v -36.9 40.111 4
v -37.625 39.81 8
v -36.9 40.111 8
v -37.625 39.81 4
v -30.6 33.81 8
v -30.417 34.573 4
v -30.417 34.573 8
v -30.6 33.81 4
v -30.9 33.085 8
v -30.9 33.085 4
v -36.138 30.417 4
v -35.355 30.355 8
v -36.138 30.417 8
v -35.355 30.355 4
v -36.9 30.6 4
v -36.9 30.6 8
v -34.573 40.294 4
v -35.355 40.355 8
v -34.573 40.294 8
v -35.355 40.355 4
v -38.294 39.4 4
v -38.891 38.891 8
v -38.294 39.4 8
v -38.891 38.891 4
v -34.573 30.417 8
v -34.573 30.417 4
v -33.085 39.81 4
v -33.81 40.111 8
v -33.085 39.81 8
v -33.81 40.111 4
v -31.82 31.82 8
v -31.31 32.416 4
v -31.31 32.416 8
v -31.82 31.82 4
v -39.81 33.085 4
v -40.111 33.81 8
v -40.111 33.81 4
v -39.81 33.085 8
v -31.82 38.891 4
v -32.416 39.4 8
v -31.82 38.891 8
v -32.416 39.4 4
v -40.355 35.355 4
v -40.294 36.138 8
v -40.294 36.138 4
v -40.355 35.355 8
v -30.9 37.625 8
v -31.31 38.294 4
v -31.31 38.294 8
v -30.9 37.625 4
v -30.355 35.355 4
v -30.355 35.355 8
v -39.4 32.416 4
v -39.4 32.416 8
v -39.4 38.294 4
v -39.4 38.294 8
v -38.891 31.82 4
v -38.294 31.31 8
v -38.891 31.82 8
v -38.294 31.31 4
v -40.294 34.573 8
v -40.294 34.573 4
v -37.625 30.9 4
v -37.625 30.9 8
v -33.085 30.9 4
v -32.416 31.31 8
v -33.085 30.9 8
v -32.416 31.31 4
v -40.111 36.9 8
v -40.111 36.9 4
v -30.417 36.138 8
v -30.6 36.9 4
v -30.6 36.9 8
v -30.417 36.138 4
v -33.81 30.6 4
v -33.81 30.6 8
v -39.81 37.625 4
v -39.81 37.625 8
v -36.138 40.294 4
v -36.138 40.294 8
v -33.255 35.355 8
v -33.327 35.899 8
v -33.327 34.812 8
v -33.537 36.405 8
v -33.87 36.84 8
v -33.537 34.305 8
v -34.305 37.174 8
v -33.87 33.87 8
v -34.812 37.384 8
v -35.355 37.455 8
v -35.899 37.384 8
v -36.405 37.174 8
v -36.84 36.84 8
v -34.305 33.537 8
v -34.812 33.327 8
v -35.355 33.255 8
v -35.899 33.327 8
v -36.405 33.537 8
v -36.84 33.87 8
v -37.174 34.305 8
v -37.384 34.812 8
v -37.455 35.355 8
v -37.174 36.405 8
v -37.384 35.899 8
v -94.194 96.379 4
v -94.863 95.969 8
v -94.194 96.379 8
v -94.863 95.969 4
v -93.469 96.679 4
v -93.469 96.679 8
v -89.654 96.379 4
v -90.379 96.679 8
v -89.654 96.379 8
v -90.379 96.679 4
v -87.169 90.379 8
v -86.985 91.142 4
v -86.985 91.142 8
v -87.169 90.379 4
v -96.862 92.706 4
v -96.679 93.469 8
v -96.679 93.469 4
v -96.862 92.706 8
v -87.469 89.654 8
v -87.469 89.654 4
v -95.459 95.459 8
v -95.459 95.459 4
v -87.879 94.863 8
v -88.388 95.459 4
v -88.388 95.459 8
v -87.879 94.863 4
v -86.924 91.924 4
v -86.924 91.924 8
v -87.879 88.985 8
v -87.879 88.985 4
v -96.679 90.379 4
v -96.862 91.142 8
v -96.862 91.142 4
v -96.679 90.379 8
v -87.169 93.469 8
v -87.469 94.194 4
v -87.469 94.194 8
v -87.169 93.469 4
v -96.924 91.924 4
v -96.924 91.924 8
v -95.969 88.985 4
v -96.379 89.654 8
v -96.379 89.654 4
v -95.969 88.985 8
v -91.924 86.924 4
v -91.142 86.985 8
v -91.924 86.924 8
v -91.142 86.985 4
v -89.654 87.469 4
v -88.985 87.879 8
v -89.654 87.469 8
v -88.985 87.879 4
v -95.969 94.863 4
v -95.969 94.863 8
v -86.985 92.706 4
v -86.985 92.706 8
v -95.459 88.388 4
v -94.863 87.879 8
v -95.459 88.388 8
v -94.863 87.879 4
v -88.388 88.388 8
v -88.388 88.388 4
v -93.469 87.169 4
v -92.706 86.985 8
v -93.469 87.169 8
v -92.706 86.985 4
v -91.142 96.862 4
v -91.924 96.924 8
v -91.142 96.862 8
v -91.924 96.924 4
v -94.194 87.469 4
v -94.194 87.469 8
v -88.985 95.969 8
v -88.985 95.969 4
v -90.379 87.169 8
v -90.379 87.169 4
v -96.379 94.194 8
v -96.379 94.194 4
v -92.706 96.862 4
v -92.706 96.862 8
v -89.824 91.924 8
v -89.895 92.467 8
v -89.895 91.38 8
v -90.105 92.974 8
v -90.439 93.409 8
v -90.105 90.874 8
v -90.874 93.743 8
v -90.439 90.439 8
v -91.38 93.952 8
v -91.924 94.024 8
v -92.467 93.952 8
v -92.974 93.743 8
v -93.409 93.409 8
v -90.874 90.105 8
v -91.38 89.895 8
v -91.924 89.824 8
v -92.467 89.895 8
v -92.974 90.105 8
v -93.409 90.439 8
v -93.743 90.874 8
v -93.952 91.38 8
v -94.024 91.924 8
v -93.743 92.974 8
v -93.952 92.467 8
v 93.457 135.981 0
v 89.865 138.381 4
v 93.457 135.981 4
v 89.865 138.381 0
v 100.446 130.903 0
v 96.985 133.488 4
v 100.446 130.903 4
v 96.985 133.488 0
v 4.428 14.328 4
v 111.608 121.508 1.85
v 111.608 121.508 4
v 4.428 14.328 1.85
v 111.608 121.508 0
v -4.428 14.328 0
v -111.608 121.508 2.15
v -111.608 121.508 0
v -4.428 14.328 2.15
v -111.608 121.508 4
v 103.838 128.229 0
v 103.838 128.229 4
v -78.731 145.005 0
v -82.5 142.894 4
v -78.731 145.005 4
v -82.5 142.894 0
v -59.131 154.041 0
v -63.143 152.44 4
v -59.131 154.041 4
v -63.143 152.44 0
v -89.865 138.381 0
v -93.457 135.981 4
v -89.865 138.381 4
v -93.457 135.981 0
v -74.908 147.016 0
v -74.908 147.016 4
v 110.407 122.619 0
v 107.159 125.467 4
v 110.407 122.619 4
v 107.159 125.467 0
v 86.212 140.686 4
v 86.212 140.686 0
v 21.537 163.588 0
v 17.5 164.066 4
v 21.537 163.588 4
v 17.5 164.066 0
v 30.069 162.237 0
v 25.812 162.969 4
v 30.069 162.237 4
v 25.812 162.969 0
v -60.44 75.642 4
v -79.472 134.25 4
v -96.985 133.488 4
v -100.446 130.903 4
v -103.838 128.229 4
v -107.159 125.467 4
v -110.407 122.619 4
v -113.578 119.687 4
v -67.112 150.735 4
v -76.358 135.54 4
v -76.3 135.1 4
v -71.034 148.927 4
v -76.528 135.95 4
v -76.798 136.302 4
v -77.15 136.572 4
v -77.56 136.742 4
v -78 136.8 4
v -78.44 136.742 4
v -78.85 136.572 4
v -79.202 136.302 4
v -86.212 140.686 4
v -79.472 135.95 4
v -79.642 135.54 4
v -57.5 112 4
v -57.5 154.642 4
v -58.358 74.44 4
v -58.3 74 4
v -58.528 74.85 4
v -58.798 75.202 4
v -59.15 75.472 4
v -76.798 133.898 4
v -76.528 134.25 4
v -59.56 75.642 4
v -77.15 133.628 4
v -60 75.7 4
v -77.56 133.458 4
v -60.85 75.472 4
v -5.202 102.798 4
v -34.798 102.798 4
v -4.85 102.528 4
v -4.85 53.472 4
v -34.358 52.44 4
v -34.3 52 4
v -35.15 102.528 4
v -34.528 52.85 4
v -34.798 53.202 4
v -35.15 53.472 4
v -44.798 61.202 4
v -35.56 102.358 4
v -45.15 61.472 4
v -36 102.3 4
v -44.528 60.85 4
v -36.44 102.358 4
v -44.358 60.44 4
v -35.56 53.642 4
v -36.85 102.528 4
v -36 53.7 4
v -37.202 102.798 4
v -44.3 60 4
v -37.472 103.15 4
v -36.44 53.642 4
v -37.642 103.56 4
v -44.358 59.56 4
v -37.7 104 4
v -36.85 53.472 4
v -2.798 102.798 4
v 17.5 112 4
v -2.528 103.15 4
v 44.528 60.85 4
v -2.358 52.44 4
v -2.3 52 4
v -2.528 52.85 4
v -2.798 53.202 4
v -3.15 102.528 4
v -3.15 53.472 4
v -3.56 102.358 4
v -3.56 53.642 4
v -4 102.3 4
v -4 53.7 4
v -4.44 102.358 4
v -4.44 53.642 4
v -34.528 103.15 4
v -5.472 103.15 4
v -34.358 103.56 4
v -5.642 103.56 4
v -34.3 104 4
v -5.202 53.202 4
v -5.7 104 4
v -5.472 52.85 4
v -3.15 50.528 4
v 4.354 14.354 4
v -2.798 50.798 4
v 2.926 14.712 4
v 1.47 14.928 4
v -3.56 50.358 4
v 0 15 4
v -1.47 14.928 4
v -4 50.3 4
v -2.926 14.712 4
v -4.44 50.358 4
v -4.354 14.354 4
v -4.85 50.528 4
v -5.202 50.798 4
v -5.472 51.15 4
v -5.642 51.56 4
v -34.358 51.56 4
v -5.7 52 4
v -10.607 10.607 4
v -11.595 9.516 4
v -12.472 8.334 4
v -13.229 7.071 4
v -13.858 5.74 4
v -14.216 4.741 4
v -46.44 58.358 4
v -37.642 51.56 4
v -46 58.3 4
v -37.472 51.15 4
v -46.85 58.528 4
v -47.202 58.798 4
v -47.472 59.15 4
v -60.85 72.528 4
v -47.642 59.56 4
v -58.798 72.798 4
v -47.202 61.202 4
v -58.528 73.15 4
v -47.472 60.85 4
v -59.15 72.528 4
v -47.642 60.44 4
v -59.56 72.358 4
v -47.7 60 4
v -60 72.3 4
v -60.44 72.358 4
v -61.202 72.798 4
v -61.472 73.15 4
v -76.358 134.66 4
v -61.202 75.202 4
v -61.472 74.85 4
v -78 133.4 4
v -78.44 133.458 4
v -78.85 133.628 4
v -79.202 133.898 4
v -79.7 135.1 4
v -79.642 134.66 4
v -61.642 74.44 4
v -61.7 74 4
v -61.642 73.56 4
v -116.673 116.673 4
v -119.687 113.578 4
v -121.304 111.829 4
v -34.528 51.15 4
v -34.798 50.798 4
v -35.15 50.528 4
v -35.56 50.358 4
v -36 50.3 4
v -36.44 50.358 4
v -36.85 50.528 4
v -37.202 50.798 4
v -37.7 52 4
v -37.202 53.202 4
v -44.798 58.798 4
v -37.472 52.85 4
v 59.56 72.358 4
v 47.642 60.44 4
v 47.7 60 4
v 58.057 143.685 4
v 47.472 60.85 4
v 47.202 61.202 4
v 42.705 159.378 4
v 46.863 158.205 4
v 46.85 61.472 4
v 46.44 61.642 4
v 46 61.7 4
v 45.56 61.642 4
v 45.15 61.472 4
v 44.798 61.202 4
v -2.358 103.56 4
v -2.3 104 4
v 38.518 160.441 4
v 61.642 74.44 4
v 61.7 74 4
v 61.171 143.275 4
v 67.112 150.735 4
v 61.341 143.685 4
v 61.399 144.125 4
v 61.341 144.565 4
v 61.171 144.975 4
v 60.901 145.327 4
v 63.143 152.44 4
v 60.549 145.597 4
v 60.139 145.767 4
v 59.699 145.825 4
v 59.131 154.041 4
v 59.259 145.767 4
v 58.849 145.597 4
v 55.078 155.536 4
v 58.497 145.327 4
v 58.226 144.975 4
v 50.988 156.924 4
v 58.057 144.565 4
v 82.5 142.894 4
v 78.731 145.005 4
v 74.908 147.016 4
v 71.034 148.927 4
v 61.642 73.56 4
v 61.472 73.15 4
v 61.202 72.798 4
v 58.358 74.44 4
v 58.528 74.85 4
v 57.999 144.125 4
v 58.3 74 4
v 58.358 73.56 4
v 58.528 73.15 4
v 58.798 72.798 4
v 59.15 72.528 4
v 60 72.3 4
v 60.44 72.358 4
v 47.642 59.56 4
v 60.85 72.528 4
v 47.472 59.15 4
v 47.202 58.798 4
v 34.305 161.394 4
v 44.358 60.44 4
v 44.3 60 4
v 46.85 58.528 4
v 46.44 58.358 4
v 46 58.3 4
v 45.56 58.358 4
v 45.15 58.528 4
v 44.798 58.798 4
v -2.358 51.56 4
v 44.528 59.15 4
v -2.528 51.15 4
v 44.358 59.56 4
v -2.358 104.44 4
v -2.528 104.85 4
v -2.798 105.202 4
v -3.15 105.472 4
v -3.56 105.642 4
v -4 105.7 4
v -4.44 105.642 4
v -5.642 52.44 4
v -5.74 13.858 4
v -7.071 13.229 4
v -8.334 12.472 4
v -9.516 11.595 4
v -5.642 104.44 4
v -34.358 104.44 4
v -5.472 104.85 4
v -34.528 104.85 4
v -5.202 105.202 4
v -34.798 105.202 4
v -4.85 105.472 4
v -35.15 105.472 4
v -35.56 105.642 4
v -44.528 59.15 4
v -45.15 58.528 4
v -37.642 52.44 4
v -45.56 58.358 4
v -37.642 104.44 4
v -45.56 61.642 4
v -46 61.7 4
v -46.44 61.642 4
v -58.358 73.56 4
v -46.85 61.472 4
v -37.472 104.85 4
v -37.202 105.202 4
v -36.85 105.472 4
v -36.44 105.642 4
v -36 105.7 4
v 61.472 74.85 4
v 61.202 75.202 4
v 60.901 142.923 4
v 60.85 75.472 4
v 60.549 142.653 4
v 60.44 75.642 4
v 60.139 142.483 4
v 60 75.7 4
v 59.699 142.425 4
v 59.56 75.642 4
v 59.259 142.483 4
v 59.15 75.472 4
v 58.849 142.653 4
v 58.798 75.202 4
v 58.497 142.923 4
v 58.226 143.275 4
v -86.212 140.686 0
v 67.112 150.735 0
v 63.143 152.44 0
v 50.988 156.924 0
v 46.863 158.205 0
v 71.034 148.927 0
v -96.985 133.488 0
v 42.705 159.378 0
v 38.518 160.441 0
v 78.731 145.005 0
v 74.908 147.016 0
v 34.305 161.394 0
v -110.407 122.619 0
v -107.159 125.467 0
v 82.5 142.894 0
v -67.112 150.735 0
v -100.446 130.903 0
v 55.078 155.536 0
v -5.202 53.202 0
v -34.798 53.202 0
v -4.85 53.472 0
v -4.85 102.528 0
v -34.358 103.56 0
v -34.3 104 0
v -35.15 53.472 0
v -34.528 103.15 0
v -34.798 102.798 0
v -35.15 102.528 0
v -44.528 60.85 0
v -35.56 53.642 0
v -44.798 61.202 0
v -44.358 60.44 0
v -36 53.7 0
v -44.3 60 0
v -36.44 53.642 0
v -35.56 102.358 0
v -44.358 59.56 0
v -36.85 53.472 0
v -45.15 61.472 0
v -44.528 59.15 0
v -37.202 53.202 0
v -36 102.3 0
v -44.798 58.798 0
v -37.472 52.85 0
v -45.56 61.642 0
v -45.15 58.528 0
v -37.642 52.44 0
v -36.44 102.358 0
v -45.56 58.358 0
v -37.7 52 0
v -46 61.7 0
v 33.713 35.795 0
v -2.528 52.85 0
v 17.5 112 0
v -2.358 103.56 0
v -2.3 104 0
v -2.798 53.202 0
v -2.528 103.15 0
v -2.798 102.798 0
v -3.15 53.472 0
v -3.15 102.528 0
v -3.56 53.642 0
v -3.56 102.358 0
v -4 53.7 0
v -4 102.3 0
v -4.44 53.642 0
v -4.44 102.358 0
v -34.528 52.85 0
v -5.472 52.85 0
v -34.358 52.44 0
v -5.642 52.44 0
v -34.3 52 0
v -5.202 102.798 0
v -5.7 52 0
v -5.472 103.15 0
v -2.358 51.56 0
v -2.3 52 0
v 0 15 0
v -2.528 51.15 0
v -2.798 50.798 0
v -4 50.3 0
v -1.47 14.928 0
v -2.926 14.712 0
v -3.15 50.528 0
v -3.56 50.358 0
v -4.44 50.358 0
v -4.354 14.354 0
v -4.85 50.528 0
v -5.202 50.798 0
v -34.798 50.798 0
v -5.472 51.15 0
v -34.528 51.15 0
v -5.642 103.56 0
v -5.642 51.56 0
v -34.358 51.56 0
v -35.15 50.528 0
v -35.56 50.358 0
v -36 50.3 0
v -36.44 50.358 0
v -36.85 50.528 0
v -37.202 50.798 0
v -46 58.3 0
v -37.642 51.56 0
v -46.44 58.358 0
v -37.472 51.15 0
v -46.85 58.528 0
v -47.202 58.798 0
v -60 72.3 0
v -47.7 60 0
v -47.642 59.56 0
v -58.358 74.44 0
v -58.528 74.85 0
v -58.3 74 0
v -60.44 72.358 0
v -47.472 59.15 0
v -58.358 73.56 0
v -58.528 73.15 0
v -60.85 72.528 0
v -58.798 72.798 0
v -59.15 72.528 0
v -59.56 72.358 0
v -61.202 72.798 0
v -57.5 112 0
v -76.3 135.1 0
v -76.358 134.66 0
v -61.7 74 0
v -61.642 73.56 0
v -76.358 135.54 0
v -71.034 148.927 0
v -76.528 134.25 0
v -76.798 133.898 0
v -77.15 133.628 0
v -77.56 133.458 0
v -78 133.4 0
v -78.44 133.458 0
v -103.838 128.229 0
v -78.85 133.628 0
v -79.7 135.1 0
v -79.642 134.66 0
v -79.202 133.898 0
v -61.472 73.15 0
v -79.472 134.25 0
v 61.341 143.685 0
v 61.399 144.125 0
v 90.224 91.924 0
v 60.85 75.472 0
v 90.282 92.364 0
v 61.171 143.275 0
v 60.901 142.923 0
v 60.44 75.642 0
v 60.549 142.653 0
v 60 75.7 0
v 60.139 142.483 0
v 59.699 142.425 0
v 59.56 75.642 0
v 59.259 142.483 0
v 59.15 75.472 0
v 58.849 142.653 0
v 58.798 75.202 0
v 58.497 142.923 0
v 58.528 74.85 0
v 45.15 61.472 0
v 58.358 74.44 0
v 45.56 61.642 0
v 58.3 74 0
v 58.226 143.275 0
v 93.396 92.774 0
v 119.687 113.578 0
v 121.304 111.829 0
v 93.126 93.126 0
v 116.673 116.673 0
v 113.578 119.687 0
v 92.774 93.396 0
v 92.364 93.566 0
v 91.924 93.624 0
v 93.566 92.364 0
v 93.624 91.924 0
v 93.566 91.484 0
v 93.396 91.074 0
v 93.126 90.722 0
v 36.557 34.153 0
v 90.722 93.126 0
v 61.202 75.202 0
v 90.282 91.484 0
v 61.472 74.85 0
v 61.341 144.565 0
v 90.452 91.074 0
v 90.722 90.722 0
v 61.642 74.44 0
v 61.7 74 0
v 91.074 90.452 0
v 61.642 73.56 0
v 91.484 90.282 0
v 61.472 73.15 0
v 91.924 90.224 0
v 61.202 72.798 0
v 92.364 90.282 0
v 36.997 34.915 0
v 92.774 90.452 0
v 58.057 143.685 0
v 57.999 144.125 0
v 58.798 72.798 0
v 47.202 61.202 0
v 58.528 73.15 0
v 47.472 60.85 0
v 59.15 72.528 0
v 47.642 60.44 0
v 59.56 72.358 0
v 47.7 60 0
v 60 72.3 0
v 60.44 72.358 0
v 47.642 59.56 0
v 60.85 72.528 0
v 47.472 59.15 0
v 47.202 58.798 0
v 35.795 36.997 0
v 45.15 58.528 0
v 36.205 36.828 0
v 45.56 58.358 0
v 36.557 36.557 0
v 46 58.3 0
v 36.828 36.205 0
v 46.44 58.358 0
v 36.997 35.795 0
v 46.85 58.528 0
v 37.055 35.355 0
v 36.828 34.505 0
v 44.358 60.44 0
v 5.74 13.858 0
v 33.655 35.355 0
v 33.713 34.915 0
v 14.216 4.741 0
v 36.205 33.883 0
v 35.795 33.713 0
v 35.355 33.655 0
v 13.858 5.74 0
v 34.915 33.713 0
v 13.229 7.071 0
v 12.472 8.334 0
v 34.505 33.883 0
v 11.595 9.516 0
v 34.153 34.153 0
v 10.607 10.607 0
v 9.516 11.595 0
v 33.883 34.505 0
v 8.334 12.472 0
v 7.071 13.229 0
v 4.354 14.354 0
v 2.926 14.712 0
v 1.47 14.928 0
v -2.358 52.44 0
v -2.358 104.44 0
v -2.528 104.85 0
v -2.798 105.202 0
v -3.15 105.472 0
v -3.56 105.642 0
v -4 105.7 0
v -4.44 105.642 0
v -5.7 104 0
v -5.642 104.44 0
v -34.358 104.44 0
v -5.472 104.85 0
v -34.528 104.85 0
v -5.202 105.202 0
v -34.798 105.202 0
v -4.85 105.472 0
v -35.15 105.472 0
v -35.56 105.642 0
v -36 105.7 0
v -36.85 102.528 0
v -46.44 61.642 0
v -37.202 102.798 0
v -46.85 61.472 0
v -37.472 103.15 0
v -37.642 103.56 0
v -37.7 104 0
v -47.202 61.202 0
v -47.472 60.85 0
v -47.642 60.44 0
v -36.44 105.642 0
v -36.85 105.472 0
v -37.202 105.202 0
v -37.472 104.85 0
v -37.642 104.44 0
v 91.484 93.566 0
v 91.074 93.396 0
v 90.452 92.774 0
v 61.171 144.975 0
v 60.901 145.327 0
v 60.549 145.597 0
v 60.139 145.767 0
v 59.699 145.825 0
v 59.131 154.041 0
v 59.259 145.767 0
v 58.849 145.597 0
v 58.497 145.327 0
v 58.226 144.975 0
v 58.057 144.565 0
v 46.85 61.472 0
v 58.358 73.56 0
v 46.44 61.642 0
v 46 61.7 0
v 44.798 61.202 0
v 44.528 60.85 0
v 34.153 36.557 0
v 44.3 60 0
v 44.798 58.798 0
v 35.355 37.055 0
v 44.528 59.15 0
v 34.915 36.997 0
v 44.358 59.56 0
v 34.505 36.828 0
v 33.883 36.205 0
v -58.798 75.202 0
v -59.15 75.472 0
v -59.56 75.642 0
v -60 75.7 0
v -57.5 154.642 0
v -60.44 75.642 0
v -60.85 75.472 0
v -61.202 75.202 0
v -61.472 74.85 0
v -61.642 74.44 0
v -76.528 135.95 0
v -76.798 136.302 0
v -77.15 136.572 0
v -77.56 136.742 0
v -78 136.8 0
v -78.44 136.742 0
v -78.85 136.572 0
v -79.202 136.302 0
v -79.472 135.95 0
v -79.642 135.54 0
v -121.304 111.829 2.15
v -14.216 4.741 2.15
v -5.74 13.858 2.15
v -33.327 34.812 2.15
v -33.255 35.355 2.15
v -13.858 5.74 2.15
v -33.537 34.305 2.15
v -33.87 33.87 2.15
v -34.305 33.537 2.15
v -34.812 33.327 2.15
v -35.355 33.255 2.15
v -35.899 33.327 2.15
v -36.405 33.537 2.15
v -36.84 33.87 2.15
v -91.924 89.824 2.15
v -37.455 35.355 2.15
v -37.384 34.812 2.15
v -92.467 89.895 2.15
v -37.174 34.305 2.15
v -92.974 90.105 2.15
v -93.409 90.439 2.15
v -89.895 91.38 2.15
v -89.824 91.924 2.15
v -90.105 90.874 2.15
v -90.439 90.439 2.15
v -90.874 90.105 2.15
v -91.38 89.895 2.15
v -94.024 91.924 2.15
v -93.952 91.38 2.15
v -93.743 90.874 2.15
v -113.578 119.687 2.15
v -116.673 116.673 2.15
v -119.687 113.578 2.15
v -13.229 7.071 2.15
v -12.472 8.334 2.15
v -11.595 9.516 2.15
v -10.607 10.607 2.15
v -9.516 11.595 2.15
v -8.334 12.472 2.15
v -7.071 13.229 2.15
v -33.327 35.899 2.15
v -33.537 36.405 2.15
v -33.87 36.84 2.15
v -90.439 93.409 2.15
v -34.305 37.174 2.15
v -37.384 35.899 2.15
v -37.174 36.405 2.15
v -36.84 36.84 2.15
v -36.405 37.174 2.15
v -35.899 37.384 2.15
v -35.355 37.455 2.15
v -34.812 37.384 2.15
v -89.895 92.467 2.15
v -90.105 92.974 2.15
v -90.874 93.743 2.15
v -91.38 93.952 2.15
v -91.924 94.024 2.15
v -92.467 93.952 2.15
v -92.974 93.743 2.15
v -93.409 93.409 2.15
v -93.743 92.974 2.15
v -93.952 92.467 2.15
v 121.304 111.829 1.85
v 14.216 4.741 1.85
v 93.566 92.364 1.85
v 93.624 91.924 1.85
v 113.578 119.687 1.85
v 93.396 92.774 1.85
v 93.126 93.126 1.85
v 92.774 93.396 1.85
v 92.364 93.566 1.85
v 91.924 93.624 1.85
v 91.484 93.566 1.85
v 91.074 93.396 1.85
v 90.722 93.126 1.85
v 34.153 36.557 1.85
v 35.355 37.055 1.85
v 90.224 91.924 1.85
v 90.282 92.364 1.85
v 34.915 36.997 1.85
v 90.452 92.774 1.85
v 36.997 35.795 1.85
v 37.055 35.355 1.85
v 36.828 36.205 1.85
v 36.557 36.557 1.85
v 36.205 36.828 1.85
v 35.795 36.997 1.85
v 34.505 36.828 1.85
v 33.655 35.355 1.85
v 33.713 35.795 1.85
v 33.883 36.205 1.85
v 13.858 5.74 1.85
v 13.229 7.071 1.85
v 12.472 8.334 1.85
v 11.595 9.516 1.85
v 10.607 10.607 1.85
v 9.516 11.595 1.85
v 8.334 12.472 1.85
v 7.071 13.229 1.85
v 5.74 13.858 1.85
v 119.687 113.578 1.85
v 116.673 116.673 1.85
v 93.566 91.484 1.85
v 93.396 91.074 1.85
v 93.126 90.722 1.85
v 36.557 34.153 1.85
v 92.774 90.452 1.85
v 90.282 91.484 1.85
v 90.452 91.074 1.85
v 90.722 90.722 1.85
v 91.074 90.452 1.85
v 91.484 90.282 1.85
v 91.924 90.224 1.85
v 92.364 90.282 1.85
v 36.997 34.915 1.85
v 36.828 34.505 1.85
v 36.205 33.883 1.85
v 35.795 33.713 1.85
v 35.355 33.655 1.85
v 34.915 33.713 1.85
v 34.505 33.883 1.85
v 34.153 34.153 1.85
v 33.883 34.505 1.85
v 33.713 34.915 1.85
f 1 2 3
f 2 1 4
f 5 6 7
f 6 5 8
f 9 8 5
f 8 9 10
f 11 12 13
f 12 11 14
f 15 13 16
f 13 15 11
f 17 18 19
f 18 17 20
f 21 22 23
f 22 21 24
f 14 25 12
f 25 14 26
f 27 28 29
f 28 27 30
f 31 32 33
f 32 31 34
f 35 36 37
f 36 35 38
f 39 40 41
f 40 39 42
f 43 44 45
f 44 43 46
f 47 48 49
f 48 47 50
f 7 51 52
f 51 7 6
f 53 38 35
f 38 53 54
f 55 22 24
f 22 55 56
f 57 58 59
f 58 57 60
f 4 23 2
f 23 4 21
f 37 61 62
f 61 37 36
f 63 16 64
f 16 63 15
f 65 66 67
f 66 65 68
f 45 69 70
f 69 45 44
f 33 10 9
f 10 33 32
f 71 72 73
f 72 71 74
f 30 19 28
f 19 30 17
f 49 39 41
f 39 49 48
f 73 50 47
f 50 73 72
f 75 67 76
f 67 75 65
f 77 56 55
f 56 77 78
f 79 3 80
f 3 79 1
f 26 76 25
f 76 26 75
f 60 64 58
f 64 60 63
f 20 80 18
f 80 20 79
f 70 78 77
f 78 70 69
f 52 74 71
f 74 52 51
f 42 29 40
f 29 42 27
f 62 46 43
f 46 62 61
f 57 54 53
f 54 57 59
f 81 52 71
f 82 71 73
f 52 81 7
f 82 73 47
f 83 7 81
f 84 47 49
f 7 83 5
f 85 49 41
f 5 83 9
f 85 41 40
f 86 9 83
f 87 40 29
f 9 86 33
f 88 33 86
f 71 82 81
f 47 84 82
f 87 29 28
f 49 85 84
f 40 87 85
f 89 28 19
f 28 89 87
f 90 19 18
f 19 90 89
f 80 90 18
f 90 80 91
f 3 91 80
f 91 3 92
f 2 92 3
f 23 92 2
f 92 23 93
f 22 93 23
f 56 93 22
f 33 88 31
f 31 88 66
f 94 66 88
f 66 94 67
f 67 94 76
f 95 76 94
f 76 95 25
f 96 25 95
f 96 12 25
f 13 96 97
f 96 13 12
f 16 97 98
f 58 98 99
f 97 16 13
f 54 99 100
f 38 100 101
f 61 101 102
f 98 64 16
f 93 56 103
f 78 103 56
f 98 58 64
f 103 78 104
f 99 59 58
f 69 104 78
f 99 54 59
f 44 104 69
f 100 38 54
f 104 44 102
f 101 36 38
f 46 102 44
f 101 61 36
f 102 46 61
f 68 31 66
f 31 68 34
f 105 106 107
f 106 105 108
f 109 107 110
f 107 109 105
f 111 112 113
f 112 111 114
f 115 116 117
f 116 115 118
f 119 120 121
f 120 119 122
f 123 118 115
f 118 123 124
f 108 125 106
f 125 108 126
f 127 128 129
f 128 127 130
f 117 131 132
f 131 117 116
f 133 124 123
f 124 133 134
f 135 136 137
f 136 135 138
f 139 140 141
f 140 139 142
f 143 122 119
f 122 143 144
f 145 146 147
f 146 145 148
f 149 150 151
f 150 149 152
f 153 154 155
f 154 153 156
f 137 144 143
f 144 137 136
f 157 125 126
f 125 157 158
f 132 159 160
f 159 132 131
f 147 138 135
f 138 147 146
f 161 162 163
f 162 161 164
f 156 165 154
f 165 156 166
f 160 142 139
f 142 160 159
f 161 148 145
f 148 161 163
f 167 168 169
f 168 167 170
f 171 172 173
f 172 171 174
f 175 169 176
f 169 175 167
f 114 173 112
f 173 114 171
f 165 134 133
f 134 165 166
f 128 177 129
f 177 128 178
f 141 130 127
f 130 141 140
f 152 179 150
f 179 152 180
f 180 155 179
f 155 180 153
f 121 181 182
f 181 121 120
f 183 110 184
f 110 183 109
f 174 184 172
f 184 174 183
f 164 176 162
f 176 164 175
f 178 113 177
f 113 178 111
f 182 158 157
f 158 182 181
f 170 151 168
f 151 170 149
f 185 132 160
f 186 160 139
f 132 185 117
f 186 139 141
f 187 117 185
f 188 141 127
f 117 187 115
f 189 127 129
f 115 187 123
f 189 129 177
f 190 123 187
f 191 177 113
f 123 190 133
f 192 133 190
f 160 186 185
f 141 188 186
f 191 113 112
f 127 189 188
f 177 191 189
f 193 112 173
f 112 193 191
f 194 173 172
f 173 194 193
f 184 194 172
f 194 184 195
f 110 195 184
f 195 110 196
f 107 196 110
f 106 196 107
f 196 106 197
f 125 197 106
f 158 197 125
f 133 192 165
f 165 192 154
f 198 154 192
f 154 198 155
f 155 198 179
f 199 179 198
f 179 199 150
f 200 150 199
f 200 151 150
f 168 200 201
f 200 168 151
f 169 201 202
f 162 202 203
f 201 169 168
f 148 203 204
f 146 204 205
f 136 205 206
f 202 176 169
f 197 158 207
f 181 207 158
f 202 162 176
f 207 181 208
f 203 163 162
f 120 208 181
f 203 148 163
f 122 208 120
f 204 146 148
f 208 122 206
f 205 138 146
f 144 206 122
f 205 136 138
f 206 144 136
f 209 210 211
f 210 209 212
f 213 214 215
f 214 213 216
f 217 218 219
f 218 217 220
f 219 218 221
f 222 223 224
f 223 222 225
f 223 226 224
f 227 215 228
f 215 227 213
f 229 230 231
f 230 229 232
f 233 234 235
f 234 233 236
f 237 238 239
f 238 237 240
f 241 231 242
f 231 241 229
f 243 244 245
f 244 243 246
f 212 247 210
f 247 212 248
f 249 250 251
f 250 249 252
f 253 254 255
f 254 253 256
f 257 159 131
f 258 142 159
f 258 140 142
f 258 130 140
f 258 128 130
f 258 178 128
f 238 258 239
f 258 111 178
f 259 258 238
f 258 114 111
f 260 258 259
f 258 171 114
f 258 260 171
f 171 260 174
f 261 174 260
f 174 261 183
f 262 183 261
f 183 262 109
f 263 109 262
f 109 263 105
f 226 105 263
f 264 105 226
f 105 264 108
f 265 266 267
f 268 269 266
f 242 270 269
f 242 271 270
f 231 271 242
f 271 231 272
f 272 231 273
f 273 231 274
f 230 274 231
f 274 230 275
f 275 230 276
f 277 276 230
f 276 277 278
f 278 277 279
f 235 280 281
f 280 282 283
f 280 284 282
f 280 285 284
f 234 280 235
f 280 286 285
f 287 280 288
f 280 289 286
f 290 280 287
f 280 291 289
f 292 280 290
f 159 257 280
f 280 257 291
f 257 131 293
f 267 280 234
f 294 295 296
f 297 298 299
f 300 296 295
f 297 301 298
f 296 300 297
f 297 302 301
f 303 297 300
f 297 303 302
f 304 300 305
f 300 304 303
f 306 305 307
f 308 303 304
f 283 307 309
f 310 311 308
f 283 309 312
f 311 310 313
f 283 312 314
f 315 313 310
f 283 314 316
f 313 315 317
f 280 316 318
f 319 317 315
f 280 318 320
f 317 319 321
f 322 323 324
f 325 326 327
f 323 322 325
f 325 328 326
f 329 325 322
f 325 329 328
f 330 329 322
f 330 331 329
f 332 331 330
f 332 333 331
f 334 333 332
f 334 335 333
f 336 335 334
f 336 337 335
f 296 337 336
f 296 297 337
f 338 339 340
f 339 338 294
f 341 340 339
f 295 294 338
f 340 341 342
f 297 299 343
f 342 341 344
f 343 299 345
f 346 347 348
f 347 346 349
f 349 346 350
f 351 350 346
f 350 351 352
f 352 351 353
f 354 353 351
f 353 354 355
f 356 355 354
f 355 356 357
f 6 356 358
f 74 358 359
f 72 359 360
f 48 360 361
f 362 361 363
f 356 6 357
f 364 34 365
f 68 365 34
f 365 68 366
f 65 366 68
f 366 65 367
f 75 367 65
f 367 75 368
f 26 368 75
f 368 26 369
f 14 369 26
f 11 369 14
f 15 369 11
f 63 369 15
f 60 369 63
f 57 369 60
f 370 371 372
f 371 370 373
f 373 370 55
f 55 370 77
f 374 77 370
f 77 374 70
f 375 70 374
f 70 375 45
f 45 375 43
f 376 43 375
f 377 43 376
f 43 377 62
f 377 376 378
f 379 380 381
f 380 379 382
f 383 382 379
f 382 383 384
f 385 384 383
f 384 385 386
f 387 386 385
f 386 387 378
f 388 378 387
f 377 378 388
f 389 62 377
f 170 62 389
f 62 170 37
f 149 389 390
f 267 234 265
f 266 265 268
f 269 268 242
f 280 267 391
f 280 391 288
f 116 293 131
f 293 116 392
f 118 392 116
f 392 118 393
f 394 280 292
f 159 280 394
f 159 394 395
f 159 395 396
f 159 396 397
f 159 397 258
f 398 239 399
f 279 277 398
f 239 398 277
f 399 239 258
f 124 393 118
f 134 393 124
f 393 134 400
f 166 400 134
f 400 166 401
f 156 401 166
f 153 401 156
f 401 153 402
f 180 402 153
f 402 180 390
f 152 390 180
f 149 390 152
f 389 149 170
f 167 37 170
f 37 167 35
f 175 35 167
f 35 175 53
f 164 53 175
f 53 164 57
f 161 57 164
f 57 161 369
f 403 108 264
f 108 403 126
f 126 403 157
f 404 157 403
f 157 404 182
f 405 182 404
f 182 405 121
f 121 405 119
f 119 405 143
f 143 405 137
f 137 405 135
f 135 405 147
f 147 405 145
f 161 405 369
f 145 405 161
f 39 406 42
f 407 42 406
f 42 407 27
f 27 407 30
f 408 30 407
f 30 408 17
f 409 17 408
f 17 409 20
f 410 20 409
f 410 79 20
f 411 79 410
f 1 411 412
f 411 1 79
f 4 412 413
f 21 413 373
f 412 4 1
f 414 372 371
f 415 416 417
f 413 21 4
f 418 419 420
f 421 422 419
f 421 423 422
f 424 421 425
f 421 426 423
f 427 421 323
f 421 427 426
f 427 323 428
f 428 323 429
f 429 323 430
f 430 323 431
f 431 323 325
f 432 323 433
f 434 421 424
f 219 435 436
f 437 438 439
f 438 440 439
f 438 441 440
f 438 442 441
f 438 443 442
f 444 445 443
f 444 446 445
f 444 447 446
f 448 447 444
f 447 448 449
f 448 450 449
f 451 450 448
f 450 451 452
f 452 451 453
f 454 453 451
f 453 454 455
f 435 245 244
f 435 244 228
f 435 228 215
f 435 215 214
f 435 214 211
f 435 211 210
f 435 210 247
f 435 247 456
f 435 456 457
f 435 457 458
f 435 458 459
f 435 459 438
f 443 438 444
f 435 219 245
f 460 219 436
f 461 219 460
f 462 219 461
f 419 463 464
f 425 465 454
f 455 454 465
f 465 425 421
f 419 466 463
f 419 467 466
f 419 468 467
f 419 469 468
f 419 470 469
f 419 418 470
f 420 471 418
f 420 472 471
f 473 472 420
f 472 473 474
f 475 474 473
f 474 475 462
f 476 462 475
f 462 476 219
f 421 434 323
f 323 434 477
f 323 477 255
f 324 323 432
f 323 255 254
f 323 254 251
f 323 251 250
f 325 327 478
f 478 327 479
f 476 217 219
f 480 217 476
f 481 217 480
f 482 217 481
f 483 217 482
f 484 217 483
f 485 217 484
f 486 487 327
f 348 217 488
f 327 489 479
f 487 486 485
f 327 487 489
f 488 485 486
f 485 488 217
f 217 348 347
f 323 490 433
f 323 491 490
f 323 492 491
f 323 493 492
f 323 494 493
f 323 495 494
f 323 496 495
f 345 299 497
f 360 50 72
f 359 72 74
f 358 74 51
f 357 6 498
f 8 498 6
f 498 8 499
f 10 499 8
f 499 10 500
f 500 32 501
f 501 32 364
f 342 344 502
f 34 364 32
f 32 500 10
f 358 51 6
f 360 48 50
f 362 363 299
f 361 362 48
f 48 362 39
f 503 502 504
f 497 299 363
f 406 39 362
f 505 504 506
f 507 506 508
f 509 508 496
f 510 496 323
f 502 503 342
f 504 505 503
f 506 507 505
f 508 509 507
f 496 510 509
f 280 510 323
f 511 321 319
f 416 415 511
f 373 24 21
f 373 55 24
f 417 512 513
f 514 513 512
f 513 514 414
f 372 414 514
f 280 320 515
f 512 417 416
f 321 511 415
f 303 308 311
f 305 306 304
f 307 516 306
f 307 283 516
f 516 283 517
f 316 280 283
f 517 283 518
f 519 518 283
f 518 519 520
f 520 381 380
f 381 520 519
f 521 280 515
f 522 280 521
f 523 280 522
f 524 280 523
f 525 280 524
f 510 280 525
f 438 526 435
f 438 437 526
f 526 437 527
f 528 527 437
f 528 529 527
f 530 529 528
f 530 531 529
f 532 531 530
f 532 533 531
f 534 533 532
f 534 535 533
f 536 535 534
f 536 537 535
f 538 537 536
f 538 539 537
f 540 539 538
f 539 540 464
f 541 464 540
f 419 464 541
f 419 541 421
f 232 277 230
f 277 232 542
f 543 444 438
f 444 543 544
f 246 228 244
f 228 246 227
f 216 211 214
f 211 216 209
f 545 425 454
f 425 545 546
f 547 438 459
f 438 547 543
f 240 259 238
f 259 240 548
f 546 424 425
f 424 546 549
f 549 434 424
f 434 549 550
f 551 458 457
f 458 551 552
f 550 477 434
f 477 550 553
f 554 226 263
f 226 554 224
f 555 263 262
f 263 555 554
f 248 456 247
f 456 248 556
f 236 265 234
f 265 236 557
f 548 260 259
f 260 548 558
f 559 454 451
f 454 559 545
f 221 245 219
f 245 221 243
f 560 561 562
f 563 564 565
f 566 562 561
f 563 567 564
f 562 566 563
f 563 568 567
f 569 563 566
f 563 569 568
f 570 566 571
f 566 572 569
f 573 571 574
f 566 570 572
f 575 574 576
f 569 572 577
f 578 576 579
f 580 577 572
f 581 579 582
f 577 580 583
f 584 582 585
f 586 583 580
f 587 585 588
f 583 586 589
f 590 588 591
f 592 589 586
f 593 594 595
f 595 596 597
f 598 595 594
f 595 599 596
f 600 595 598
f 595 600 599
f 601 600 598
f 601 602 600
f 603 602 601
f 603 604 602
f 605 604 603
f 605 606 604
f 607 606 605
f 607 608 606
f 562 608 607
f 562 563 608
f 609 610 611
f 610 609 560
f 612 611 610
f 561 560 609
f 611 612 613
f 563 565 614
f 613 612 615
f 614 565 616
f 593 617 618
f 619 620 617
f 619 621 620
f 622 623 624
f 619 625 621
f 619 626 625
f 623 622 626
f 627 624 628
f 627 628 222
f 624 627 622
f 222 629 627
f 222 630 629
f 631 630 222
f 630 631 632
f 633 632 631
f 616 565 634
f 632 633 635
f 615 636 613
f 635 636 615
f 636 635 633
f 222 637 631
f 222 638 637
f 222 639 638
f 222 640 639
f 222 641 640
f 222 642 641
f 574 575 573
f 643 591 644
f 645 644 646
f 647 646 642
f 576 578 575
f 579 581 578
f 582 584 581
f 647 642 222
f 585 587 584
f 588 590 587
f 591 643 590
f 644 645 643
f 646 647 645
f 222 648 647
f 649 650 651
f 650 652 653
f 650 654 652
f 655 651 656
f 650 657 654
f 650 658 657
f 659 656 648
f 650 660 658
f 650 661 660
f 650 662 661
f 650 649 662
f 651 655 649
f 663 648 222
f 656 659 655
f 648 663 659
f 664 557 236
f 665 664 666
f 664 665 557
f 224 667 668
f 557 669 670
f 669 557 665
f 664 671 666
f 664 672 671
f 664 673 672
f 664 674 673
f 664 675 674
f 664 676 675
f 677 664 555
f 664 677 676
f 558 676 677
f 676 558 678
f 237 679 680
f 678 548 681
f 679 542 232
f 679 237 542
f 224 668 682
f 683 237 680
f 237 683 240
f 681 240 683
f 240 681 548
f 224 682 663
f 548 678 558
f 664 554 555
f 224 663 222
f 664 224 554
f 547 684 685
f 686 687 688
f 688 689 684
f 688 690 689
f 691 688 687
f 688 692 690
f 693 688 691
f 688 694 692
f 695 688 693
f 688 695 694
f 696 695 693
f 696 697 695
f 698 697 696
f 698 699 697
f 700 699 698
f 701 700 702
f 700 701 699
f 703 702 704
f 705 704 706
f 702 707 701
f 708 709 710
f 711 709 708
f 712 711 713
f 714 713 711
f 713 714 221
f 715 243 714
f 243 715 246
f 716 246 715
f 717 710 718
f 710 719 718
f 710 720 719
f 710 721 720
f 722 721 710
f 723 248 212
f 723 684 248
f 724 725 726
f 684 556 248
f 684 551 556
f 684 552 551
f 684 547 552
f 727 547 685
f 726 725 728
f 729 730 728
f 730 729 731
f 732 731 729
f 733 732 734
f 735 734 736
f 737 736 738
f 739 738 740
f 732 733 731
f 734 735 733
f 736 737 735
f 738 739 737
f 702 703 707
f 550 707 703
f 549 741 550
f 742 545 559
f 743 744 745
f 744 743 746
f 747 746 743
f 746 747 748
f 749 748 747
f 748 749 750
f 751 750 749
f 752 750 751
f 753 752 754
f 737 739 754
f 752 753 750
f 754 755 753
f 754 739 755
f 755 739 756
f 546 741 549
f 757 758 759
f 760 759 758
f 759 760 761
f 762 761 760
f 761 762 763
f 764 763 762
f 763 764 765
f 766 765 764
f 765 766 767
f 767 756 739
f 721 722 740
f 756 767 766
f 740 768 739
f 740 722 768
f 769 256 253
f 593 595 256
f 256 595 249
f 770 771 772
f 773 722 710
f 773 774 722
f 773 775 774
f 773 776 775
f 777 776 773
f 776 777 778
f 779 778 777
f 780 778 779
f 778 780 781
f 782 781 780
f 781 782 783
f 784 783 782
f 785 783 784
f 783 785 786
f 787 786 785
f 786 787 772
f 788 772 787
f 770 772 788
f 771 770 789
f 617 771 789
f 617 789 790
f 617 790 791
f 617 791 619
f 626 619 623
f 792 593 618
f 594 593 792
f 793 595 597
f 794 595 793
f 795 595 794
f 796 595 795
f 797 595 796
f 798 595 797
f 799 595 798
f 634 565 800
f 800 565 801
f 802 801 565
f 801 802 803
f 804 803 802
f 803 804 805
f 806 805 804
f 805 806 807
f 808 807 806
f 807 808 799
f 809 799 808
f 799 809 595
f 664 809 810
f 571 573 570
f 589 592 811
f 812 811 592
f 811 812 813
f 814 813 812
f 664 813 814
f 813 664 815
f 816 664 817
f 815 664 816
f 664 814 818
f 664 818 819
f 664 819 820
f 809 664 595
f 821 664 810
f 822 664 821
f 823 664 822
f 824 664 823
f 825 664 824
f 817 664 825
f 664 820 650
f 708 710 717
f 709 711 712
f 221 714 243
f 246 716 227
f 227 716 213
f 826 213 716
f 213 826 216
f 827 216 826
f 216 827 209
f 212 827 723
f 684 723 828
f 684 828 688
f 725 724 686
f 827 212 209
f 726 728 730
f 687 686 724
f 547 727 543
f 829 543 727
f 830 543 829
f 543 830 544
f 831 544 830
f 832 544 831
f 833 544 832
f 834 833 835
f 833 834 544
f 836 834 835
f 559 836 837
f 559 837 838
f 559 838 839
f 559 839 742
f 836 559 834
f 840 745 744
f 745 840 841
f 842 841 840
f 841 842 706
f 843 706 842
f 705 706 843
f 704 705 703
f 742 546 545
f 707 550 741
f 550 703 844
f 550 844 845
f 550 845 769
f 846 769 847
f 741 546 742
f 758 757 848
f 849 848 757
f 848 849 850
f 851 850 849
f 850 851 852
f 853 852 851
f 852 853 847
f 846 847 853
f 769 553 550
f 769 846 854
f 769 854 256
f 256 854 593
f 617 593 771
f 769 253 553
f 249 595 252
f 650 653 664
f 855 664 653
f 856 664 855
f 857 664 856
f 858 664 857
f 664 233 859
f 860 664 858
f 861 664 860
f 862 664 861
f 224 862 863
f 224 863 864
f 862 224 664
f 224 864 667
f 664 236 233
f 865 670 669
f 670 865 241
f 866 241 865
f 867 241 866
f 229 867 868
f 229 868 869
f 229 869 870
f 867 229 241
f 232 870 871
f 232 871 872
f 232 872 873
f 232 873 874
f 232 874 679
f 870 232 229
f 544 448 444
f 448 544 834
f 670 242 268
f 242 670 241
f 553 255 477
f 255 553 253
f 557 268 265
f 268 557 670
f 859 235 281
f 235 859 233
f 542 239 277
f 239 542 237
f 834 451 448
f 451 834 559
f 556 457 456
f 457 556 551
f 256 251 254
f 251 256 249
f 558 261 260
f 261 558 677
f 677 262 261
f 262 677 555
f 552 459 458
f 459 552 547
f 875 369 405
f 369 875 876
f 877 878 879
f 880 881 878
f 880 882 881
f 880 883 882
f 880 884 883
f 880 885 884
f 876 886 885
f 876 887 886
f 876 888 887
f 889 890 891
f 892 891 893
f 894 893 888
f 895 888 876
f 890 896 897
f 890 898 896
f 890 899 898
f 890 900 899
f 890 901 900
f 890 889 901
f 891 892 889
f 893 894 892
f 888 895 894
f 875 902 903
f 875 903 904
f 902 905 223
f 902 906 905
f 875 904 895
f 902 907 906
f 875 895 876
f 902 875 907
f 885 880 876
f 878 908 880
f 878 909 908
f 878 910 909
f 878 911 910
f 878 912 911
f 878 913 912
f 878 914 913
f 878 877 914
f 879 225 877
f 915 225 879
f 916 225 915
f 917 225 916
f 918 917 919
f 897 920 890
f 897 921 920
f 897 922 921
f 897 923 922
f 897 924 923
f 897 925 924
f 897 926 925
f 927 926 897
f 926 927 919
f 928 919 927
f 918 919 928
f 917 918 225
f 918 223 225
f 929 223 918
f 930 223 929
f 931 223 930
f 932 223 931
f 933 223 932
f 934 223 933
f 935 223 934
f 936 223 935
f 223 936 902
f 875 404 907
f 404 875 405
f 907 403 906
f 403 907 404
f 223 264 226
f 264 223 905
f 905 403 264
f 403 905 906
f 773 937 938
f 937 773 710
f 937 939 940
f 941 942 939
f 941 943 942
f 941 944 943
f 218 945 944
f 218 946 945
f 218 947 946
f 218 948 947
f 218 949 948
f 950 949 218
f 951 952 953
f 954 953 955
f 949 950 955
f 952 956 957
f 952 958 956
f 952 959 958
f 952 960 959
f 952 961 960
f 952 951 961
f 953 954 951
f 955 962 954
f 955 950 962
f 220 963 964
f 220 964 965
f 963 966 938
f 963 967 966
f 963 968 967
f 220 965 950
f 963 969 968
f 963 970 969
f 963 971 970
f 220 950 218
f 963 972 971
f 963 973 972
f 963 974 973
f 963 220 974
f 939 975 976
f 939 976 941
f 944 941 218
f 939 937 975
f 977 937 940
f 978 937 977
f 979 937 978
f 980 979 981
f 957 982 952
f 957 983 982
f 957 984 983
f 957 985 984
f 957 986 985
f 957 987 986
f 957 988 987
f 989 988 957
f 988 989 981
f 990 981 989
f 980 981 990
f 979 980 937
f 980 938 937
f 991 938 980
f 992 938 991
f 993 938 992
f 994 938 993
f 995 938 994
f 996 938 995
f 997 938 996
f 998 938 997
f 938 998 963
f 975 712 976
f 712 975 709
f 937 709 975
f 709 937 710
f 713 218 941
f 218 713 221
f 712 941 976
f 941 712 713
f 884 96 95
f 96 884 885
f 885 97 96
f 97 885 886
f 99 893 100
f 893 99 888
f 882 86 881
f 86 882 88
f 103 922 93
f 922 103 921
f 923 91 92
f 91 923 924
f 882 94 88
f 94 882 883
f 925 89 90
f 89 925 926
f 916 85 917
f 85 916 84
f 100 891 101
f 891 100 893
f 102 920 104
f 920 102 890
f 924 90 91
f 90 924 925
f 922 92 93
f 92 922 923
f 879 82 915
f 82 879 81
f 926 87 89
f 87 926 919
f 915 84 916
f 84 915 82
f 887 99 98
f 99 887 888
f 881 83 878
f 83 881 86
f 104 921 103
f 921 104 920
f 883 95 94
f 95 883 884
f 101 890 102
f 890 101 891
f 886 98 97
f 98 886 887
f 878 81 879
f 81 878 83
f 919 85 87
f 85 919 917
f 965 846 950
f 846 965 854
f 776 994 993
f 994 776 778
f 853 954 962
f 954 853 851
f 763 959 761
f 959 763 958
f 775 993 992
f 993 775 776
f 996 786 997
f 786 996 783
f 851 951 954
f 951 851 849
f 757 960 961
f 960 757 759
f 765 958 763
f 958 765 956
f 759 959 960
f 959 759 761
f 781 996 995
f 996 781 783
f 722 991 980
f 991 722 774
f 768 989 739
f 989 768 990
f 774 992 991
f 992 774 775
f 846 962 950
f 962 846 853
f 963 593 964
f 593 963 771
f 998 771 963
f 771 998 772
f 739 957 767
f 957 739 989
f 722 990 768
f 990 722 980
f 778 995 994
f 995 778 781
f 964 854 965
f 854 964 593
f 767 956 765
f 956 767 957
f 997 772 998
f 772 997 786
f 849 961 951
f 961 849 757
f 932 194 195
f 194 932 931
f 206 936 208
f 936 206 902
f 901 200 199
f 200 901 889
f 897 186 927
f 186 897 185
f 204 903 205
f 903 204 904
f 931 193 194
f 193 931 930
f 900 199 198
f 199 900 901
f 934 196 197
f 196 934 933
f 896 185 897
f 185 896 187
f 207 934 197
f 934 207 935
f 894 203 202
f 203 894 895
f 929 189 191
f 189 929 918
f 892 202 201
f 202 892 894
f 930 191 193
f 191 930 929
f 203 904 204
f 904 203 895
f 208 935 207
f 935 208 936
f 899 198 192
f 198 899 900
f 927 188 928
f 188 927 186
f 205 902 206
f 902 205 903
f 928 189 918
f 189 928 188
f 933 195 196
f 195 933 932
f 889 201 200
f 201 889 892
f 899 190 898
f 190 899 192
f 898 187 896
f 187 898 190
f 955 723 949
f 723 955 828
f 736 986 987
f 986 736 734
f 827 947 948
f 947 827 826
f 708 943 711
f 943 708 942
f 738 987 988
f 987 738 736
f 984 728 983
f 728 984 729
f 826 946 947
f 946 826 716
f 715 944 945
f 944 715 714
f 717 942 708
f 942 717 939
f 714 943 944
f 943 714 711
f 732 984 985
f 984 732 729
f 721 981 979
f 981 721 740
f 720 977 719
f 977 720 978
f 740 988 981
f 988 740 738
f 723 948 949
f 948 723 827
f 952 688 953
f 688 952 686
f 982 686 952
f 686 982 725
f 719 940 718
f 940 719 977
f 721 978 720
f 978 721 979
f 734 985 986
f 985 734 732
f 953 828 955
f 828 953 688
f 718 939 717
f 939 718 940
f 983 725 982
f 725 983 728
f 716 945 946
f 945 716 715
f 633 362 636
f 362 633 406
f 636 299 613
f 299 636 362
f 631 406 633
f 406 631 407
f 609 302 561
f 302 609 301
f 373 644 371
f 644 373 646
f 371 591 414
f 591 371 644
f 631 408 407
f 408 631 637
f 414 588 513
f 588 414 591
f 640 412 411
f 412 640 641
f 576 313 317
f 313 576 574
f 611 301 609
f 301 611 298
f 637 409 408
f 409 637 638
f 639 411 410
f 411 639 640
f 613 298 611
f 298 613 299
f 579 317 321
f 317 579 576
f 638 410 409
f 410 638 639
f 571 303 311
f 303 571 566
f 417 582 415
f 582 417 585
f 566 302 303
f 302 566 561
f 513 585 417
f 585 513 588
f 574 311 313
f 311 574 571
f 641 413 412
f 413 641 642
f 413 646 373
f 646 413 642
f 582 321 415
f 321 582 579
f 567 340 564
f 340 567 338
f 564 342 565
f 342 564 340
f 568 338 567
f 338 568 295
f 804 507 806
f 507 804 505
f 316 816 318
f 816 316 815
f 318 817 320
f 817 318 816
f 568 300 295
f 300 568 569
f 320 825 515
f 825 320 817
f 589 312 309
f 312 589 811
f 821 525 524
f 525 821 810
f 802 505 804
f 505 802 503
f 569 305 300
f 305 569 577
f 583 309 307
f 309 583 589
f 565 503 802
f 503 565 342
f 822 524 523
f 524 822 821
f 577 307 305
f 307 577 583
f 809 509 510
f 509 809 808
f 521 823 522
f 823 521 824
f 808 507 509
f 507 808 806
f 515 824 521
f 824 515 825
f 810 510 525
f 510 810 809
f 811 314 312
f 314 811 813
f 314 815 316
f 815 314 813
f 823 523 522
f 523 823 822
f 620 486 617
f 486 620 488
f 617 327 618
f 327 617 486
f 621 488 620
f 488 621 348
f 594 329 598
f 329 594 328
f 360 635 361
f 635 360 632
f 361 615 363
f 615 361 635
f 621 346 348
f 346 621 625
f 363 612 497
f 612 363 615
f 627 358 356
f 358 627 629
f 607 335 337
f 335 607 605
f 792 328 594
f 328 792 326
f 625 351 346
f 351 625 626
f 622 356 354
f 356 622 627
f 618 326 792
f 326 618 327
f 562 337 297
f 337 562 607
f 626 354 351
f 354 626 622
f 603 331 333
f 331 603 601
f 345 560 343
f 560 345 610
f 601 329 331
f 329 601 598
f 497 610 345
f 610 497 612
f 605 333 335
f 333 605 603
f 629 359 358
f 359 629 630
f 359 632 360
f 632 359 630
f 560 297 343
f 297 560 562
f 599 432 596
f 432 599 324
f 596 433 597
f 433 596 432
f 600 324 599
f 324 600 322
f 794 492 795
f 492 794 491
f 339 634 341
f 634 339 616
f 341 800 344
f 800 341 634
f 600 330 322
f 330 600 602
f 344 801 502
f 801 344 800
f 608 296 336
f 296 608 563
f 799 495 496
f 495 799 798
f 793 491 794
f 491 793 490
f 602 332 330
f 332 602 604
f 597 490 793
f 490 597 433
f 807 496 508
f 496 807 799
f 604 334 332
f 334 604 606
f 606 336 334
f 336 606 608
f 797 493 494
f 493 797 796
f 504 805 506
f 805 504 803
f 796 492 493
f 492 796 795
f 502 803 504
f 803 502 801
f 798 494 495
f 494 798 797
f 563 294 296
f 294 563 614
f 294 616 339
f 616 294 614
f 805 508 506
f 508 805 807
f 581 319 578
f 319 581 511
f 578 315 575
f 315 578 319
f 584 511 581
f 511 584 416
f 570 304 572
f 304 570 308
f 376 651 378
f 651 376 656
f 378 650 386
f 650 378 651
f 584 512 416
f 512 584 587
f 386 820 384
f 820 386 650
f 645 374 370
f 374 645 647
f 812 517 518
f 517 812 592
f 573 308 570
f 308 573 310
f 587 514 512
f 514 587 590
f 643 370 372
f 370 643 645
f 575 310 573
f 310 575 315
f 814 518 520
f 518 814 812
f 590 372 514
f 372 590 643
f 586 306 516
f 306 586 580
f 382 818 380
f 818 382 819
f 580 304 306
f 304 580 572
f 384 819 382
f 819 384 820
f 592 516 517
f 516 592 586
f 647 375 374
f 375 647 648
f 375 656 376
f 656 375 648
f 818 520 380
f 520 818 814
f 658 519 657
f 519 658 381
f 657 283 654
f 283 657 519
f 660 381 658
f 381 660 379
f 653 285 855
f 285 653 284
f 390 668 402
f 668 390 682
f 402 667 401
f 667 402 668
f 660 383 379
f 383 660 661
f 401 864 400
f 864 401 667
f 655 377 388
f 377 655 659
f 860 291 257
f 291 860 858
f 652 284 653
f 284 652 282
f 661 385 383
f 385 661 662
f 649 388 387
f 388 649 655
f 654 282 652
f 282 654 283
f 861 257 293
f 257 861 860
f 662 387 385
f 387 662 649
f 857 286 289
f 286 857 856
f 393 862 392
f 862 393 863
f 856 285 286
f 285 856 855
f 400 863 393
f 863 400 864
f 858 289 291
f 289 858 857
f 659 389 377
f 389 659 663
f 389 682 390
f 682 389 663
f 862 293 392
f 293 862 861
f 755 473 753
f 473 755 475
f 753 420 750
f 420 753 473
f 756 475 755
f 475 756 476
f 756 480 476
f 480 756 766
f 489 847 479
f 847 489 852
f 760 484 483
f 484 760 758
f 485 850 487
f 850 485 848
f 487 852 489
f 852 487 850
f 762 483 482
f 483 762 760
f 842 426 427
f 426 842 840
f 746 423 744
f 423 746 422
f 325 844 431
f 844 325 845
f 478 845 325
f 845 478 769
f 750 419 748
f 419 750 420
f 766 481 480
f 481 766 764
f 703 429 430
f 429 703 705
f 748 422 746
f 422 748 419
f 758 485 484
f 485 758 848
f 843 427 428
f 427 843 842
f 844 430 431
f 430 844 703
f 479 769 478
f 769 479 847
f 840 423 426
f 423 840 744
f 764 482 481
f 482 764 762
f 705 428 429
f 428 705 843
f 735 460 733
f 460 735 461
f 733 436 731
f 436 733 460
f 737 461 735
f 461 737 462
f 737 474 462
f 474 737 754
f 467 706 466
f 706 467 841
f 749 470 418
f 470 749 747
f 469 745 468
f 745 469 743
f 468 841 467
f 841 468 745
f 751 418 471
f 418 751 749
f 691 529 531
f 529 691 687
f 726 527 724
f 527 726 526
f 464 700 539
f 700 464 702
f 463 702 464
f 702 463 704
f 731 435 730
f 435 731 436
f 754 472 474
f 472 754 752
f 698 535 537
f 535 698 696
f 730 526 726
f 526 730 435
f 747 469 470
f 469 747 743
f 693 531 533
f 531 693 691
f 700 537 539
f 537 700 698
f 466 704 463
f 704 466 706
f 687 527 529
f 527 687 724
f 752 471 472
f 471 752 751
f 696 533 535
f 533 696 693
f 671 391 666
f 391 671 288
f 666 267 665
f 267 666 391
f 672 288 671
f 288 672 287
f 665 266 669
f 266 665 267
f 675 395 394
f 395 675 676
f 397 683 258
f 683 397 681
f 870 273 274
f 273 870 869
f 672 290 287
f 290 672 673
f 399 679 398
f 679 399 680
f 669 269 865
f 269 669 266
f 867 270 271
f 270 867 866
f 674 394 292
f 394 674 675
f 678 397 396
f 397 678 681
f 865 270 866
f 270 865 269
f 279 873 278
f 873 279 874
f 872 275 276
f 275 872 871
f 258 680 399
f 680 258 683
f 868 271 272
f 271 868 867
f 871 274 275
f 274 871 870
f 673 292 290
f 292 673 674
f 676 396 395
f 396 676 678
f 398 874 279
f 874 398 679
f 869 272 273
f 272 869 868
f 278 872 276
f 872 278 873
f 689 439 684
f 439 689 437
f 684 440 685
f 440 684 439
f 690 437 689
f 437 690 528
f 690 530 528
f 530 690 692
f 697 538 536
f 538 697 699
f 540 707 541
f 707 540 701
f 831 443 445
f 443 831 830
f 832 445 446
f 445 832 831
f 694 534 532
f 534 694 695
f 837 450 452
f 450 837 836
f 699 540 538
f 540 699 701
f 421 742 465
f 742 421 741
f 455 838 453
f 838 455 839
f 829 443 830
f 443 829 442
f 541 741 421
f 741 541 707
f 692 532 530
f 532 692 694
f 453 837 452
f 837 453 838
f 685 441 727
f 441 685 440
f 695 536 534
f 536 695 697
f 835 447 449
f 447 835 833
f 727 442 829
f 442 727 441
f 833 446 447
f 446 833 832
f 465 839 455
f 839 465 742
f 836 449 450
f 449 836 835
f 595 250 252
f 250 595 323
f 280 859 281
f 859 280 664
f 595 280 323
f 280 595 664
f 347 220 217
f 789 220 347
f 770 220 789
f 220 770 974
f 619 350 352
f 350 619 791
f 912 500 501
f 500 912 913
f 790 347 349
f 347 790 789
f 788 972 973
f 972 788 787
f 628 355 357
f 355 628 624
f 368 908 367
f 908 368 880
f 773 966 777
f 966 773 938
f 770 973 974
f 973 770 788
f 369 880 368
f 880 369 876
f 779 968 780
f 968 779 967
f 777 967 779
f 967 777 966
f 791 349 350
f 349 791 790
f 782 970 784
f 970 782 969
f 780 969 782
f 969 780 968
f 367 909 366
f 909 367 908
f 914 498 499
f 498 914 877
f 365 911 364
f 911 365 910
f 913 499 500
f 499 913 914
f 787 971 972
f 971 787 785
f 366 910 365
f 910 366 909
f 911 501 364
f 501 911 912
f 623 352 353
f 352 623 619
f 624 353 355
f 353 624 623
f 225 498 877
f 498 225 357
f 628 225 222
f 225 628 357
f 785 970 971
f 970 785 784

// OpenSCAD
// file: robot_floor_front.scad
// =====================================================================
//  robot body :: floor plate quadrant FRONT (centred on +X). Print 1.
//  The four quadrants (front / left / rear / right) share one generic module,
//  robot_floor_quad(i), defined HERE; robot_floor_left/rear/right.scad `use` this
//  file. The seam scheme is rotationally symmetric, so the quadrants are the same
//  plate rotated by 90 deg plus their own cut-outs.
//  world (robot frame): plate z 14..18, radius rb_R, sector -45..+45 deg.
//    Seams on the diagonals (rb_floor_seams), rb_seam_gap 0.3 mm everywhere.
//    Seam joint = 14 mm wide half-thickness lap. At a quadrant's CCW edge it is the
//    UPPER lap (z 16.15..18, 2x M3 clearance 3.4); at its CW edge it is the LOWER lap
//    (z 14..15.85) with a d10 boss below (z 10..14) carrying a through hole d4.2: the
//    M3 heat-set insert is pressed in from the boss tip, the M3x10 comes from ABOVE
//    through the neighbour's upper lap. Screws at r 50 and r 130 on each seam
//    (clear of the pillar flanges at r 67..103 and of every fixing hole).
//    Plain d3.4 holes at every rb_fix_* point (screws from below, inserts in the parts above).
//    Cable pass d30 at the centre; wheel wells cut per rb_well; ball hole d24 under
//    the caster (rb_caster_xy); rear tip skid dome at rb_skid_xy (lowest z = rb_skid_z).
//  Print: top face on the bed (upside down, z' = 18 - z), 4 mm plate, bosses/skid point up.
//    The 14 mm lower lap overhangs 2.15 mm above the bed: thin support under it.
//  Hardware per seam: 2x M3x10 + 2x M3 heat-set insert (4.2 hole).
// =====================================================================
include <../lib/params.scad>
include <../lib/robot_params.scad>

fl_lap     = 7;                          // lap half width
fl_z0      = rb_clear;  fl_z1 = rb_floor_top;  fl_zm = (fl_z0 + fl_z1) / 2;
fl_seam_r  = [50, 130];                  // screw radii along each seam
fl_boss    = [10, 4];                    // boss d, height below the plate
fl_cable_d = 30;
fl_ball_d  = 24;

function fl_inq(p, c) = abs(((atan2(p[1], p[0]) - c + 180) % 360 + 360) % 360 - 180) < 45;
function fl_pts(c) = [for (p = concat(rb_fix_motor, rb_fix_caster, rb_fix_batt, rb_fix_ebay,
                                       rb_fix_pillar, rb_fix_lid)) if (fl_inq(p, c)) p];

module fl_full2d(s0, s1) {
    intersection() {
        circle(r = rb_R, $fn = 240);
        rotate(s0) translate([-500, fl_lap]) square([1000, 500]);
        rotate(s1) translate([-500, -fl_lap - 500]) square([1000, 500]);
    }
}
module fl_lapB2d(s) intersection() {       // lower lap strip at this quadrant's CW seam
    circle(r = rb_R, $fn = 240);
    rotate(s) translate([0, -fl_lap + rb_seam_gap]) square([rb_R, 2 * fl_lap - rb_seam_gap + 0.5]);
}
module fl_lapA2d(s) intersection() {       // upper lap strip at the CCW seam
    circle(r = rb_R, $fn = 240);
    rotate(s) translate([0, -fl_lap - 0.5]) square([rb_R, 2 * fl_lap - rb_seam_gap + 0.5]);
}

module robot_floor_quad(i) {
    c = i * 90;  s0 = c - 45;  s1 = c + 45;
    g = rb_seam_gap;
    difference() {
        union() {
            translate([0, 0, fl_z0]) linear_extrude(fl_z1 - fl_z0) fl_full2d(s0, s1);
            translate([0, 0, fl_z0]) linear_extrude(fl_zm - g / 2 - fl_z0) fl_lapB2d(s0);
            translate([0, 0, fl_zm + g / 2]) linear_extrude(fl_z1 - fl_zm - g / 2) fl_lapA2d(s1);
            for (r = fl_seam_r) rotate(s0) translate([r, 0, fl_z0 - fl_boss[1]])
                cylinder(d = fl_boss[0], h = fl_boss[1] + 0.5, $fn = 40);
            if (i == 2)                    // rear tip skid dome, lowest point rb_skid_z
                translate([rb_skid_xy[0], rb_skid_xy[1], 0]) intersection() {
                    hull() {
                        translate([0, 0, fl_z0 - 1]) cylinder(r = 13, h = 1.5, $fn = 48);
                        translate([0, 0, rb_skid_z + 8]) sphere(r = 8, $fn = 48);
                    }
                    translate([-20, -20, 0]) cube([40, 40, fl_z1 - 1]);
                }
        }
        // seam screws
        for (r = fl_seam_r) {
            rotate(s0) translate([r, 0, fl_z0 - fl_boss[1] - 1]) cylinder(d = m3_insert_d, h = 20, $fn = 24);
            rotate(s1) translate([r, 0, fl_z0 - 1]) cylinder(d = m3_clear, h = 10, $fn = 24);
        }
        // fixing points
        for (p = fl_pts(c)) translate([p[0], p[1], fl_z0 - 1]) cylinder(d = m3_clear, h = 10, $fn = 24);
        // cable pass
        translate([0, 0, fl_z0 - 1]) cylinder(d = fl_cable_d, h = 10, $fn = 64);
        // ball under the caster
        if (fl_inq(rb_caster_xy, c)) translate([rb_caster_xy[0], rb_caster_xy[1], fl_z0 - 1])
            cylinder(d = fl_ball_d, h = 10, $fn = 64);
        // wheel wells
        for (s = [-1, 1]) translate([rb_axle_x - rb_well[0], s > 0 ? rb_well[1] : -rb_R - 10, fl_z0 - 1])
            cube([2 * rb_well[0], rb_R + 10 - rb_well[1], 10]);
    }
}

module robot_floor_front() robot_floor_quad(0);
module robot_floor_front_print() translate([0, 0, fl_z1]) rotate([180, 0, 0]) robot_floor_front();

robot_floor_front_print();
// main file
// =====================================================================
//  robot body :: floor plate quadrant RIGHT (centred on angle 270 deg). Print 1.
//  Same plate as robot_floor_front.scad (generic module robot_floor_quad(i), see its header
//  for the seam scheme, hardware and print orientation) with this quadrant's own cut-outs.
//  Print: top face on the bed (upside down), thin support under the lower lap.
// =====================================================================
include <../lib/params.scad>
include <../lib/robot_params.scad>
use <robot_floor_front.scad>

module robot_floor_right() robot_floor_quad(3);
module robot_floor_right_print() translate([0, 0, rb_floor_top]) rotate([180, 0, 0]) robot_floor_right();

robot_floor_right_print();
